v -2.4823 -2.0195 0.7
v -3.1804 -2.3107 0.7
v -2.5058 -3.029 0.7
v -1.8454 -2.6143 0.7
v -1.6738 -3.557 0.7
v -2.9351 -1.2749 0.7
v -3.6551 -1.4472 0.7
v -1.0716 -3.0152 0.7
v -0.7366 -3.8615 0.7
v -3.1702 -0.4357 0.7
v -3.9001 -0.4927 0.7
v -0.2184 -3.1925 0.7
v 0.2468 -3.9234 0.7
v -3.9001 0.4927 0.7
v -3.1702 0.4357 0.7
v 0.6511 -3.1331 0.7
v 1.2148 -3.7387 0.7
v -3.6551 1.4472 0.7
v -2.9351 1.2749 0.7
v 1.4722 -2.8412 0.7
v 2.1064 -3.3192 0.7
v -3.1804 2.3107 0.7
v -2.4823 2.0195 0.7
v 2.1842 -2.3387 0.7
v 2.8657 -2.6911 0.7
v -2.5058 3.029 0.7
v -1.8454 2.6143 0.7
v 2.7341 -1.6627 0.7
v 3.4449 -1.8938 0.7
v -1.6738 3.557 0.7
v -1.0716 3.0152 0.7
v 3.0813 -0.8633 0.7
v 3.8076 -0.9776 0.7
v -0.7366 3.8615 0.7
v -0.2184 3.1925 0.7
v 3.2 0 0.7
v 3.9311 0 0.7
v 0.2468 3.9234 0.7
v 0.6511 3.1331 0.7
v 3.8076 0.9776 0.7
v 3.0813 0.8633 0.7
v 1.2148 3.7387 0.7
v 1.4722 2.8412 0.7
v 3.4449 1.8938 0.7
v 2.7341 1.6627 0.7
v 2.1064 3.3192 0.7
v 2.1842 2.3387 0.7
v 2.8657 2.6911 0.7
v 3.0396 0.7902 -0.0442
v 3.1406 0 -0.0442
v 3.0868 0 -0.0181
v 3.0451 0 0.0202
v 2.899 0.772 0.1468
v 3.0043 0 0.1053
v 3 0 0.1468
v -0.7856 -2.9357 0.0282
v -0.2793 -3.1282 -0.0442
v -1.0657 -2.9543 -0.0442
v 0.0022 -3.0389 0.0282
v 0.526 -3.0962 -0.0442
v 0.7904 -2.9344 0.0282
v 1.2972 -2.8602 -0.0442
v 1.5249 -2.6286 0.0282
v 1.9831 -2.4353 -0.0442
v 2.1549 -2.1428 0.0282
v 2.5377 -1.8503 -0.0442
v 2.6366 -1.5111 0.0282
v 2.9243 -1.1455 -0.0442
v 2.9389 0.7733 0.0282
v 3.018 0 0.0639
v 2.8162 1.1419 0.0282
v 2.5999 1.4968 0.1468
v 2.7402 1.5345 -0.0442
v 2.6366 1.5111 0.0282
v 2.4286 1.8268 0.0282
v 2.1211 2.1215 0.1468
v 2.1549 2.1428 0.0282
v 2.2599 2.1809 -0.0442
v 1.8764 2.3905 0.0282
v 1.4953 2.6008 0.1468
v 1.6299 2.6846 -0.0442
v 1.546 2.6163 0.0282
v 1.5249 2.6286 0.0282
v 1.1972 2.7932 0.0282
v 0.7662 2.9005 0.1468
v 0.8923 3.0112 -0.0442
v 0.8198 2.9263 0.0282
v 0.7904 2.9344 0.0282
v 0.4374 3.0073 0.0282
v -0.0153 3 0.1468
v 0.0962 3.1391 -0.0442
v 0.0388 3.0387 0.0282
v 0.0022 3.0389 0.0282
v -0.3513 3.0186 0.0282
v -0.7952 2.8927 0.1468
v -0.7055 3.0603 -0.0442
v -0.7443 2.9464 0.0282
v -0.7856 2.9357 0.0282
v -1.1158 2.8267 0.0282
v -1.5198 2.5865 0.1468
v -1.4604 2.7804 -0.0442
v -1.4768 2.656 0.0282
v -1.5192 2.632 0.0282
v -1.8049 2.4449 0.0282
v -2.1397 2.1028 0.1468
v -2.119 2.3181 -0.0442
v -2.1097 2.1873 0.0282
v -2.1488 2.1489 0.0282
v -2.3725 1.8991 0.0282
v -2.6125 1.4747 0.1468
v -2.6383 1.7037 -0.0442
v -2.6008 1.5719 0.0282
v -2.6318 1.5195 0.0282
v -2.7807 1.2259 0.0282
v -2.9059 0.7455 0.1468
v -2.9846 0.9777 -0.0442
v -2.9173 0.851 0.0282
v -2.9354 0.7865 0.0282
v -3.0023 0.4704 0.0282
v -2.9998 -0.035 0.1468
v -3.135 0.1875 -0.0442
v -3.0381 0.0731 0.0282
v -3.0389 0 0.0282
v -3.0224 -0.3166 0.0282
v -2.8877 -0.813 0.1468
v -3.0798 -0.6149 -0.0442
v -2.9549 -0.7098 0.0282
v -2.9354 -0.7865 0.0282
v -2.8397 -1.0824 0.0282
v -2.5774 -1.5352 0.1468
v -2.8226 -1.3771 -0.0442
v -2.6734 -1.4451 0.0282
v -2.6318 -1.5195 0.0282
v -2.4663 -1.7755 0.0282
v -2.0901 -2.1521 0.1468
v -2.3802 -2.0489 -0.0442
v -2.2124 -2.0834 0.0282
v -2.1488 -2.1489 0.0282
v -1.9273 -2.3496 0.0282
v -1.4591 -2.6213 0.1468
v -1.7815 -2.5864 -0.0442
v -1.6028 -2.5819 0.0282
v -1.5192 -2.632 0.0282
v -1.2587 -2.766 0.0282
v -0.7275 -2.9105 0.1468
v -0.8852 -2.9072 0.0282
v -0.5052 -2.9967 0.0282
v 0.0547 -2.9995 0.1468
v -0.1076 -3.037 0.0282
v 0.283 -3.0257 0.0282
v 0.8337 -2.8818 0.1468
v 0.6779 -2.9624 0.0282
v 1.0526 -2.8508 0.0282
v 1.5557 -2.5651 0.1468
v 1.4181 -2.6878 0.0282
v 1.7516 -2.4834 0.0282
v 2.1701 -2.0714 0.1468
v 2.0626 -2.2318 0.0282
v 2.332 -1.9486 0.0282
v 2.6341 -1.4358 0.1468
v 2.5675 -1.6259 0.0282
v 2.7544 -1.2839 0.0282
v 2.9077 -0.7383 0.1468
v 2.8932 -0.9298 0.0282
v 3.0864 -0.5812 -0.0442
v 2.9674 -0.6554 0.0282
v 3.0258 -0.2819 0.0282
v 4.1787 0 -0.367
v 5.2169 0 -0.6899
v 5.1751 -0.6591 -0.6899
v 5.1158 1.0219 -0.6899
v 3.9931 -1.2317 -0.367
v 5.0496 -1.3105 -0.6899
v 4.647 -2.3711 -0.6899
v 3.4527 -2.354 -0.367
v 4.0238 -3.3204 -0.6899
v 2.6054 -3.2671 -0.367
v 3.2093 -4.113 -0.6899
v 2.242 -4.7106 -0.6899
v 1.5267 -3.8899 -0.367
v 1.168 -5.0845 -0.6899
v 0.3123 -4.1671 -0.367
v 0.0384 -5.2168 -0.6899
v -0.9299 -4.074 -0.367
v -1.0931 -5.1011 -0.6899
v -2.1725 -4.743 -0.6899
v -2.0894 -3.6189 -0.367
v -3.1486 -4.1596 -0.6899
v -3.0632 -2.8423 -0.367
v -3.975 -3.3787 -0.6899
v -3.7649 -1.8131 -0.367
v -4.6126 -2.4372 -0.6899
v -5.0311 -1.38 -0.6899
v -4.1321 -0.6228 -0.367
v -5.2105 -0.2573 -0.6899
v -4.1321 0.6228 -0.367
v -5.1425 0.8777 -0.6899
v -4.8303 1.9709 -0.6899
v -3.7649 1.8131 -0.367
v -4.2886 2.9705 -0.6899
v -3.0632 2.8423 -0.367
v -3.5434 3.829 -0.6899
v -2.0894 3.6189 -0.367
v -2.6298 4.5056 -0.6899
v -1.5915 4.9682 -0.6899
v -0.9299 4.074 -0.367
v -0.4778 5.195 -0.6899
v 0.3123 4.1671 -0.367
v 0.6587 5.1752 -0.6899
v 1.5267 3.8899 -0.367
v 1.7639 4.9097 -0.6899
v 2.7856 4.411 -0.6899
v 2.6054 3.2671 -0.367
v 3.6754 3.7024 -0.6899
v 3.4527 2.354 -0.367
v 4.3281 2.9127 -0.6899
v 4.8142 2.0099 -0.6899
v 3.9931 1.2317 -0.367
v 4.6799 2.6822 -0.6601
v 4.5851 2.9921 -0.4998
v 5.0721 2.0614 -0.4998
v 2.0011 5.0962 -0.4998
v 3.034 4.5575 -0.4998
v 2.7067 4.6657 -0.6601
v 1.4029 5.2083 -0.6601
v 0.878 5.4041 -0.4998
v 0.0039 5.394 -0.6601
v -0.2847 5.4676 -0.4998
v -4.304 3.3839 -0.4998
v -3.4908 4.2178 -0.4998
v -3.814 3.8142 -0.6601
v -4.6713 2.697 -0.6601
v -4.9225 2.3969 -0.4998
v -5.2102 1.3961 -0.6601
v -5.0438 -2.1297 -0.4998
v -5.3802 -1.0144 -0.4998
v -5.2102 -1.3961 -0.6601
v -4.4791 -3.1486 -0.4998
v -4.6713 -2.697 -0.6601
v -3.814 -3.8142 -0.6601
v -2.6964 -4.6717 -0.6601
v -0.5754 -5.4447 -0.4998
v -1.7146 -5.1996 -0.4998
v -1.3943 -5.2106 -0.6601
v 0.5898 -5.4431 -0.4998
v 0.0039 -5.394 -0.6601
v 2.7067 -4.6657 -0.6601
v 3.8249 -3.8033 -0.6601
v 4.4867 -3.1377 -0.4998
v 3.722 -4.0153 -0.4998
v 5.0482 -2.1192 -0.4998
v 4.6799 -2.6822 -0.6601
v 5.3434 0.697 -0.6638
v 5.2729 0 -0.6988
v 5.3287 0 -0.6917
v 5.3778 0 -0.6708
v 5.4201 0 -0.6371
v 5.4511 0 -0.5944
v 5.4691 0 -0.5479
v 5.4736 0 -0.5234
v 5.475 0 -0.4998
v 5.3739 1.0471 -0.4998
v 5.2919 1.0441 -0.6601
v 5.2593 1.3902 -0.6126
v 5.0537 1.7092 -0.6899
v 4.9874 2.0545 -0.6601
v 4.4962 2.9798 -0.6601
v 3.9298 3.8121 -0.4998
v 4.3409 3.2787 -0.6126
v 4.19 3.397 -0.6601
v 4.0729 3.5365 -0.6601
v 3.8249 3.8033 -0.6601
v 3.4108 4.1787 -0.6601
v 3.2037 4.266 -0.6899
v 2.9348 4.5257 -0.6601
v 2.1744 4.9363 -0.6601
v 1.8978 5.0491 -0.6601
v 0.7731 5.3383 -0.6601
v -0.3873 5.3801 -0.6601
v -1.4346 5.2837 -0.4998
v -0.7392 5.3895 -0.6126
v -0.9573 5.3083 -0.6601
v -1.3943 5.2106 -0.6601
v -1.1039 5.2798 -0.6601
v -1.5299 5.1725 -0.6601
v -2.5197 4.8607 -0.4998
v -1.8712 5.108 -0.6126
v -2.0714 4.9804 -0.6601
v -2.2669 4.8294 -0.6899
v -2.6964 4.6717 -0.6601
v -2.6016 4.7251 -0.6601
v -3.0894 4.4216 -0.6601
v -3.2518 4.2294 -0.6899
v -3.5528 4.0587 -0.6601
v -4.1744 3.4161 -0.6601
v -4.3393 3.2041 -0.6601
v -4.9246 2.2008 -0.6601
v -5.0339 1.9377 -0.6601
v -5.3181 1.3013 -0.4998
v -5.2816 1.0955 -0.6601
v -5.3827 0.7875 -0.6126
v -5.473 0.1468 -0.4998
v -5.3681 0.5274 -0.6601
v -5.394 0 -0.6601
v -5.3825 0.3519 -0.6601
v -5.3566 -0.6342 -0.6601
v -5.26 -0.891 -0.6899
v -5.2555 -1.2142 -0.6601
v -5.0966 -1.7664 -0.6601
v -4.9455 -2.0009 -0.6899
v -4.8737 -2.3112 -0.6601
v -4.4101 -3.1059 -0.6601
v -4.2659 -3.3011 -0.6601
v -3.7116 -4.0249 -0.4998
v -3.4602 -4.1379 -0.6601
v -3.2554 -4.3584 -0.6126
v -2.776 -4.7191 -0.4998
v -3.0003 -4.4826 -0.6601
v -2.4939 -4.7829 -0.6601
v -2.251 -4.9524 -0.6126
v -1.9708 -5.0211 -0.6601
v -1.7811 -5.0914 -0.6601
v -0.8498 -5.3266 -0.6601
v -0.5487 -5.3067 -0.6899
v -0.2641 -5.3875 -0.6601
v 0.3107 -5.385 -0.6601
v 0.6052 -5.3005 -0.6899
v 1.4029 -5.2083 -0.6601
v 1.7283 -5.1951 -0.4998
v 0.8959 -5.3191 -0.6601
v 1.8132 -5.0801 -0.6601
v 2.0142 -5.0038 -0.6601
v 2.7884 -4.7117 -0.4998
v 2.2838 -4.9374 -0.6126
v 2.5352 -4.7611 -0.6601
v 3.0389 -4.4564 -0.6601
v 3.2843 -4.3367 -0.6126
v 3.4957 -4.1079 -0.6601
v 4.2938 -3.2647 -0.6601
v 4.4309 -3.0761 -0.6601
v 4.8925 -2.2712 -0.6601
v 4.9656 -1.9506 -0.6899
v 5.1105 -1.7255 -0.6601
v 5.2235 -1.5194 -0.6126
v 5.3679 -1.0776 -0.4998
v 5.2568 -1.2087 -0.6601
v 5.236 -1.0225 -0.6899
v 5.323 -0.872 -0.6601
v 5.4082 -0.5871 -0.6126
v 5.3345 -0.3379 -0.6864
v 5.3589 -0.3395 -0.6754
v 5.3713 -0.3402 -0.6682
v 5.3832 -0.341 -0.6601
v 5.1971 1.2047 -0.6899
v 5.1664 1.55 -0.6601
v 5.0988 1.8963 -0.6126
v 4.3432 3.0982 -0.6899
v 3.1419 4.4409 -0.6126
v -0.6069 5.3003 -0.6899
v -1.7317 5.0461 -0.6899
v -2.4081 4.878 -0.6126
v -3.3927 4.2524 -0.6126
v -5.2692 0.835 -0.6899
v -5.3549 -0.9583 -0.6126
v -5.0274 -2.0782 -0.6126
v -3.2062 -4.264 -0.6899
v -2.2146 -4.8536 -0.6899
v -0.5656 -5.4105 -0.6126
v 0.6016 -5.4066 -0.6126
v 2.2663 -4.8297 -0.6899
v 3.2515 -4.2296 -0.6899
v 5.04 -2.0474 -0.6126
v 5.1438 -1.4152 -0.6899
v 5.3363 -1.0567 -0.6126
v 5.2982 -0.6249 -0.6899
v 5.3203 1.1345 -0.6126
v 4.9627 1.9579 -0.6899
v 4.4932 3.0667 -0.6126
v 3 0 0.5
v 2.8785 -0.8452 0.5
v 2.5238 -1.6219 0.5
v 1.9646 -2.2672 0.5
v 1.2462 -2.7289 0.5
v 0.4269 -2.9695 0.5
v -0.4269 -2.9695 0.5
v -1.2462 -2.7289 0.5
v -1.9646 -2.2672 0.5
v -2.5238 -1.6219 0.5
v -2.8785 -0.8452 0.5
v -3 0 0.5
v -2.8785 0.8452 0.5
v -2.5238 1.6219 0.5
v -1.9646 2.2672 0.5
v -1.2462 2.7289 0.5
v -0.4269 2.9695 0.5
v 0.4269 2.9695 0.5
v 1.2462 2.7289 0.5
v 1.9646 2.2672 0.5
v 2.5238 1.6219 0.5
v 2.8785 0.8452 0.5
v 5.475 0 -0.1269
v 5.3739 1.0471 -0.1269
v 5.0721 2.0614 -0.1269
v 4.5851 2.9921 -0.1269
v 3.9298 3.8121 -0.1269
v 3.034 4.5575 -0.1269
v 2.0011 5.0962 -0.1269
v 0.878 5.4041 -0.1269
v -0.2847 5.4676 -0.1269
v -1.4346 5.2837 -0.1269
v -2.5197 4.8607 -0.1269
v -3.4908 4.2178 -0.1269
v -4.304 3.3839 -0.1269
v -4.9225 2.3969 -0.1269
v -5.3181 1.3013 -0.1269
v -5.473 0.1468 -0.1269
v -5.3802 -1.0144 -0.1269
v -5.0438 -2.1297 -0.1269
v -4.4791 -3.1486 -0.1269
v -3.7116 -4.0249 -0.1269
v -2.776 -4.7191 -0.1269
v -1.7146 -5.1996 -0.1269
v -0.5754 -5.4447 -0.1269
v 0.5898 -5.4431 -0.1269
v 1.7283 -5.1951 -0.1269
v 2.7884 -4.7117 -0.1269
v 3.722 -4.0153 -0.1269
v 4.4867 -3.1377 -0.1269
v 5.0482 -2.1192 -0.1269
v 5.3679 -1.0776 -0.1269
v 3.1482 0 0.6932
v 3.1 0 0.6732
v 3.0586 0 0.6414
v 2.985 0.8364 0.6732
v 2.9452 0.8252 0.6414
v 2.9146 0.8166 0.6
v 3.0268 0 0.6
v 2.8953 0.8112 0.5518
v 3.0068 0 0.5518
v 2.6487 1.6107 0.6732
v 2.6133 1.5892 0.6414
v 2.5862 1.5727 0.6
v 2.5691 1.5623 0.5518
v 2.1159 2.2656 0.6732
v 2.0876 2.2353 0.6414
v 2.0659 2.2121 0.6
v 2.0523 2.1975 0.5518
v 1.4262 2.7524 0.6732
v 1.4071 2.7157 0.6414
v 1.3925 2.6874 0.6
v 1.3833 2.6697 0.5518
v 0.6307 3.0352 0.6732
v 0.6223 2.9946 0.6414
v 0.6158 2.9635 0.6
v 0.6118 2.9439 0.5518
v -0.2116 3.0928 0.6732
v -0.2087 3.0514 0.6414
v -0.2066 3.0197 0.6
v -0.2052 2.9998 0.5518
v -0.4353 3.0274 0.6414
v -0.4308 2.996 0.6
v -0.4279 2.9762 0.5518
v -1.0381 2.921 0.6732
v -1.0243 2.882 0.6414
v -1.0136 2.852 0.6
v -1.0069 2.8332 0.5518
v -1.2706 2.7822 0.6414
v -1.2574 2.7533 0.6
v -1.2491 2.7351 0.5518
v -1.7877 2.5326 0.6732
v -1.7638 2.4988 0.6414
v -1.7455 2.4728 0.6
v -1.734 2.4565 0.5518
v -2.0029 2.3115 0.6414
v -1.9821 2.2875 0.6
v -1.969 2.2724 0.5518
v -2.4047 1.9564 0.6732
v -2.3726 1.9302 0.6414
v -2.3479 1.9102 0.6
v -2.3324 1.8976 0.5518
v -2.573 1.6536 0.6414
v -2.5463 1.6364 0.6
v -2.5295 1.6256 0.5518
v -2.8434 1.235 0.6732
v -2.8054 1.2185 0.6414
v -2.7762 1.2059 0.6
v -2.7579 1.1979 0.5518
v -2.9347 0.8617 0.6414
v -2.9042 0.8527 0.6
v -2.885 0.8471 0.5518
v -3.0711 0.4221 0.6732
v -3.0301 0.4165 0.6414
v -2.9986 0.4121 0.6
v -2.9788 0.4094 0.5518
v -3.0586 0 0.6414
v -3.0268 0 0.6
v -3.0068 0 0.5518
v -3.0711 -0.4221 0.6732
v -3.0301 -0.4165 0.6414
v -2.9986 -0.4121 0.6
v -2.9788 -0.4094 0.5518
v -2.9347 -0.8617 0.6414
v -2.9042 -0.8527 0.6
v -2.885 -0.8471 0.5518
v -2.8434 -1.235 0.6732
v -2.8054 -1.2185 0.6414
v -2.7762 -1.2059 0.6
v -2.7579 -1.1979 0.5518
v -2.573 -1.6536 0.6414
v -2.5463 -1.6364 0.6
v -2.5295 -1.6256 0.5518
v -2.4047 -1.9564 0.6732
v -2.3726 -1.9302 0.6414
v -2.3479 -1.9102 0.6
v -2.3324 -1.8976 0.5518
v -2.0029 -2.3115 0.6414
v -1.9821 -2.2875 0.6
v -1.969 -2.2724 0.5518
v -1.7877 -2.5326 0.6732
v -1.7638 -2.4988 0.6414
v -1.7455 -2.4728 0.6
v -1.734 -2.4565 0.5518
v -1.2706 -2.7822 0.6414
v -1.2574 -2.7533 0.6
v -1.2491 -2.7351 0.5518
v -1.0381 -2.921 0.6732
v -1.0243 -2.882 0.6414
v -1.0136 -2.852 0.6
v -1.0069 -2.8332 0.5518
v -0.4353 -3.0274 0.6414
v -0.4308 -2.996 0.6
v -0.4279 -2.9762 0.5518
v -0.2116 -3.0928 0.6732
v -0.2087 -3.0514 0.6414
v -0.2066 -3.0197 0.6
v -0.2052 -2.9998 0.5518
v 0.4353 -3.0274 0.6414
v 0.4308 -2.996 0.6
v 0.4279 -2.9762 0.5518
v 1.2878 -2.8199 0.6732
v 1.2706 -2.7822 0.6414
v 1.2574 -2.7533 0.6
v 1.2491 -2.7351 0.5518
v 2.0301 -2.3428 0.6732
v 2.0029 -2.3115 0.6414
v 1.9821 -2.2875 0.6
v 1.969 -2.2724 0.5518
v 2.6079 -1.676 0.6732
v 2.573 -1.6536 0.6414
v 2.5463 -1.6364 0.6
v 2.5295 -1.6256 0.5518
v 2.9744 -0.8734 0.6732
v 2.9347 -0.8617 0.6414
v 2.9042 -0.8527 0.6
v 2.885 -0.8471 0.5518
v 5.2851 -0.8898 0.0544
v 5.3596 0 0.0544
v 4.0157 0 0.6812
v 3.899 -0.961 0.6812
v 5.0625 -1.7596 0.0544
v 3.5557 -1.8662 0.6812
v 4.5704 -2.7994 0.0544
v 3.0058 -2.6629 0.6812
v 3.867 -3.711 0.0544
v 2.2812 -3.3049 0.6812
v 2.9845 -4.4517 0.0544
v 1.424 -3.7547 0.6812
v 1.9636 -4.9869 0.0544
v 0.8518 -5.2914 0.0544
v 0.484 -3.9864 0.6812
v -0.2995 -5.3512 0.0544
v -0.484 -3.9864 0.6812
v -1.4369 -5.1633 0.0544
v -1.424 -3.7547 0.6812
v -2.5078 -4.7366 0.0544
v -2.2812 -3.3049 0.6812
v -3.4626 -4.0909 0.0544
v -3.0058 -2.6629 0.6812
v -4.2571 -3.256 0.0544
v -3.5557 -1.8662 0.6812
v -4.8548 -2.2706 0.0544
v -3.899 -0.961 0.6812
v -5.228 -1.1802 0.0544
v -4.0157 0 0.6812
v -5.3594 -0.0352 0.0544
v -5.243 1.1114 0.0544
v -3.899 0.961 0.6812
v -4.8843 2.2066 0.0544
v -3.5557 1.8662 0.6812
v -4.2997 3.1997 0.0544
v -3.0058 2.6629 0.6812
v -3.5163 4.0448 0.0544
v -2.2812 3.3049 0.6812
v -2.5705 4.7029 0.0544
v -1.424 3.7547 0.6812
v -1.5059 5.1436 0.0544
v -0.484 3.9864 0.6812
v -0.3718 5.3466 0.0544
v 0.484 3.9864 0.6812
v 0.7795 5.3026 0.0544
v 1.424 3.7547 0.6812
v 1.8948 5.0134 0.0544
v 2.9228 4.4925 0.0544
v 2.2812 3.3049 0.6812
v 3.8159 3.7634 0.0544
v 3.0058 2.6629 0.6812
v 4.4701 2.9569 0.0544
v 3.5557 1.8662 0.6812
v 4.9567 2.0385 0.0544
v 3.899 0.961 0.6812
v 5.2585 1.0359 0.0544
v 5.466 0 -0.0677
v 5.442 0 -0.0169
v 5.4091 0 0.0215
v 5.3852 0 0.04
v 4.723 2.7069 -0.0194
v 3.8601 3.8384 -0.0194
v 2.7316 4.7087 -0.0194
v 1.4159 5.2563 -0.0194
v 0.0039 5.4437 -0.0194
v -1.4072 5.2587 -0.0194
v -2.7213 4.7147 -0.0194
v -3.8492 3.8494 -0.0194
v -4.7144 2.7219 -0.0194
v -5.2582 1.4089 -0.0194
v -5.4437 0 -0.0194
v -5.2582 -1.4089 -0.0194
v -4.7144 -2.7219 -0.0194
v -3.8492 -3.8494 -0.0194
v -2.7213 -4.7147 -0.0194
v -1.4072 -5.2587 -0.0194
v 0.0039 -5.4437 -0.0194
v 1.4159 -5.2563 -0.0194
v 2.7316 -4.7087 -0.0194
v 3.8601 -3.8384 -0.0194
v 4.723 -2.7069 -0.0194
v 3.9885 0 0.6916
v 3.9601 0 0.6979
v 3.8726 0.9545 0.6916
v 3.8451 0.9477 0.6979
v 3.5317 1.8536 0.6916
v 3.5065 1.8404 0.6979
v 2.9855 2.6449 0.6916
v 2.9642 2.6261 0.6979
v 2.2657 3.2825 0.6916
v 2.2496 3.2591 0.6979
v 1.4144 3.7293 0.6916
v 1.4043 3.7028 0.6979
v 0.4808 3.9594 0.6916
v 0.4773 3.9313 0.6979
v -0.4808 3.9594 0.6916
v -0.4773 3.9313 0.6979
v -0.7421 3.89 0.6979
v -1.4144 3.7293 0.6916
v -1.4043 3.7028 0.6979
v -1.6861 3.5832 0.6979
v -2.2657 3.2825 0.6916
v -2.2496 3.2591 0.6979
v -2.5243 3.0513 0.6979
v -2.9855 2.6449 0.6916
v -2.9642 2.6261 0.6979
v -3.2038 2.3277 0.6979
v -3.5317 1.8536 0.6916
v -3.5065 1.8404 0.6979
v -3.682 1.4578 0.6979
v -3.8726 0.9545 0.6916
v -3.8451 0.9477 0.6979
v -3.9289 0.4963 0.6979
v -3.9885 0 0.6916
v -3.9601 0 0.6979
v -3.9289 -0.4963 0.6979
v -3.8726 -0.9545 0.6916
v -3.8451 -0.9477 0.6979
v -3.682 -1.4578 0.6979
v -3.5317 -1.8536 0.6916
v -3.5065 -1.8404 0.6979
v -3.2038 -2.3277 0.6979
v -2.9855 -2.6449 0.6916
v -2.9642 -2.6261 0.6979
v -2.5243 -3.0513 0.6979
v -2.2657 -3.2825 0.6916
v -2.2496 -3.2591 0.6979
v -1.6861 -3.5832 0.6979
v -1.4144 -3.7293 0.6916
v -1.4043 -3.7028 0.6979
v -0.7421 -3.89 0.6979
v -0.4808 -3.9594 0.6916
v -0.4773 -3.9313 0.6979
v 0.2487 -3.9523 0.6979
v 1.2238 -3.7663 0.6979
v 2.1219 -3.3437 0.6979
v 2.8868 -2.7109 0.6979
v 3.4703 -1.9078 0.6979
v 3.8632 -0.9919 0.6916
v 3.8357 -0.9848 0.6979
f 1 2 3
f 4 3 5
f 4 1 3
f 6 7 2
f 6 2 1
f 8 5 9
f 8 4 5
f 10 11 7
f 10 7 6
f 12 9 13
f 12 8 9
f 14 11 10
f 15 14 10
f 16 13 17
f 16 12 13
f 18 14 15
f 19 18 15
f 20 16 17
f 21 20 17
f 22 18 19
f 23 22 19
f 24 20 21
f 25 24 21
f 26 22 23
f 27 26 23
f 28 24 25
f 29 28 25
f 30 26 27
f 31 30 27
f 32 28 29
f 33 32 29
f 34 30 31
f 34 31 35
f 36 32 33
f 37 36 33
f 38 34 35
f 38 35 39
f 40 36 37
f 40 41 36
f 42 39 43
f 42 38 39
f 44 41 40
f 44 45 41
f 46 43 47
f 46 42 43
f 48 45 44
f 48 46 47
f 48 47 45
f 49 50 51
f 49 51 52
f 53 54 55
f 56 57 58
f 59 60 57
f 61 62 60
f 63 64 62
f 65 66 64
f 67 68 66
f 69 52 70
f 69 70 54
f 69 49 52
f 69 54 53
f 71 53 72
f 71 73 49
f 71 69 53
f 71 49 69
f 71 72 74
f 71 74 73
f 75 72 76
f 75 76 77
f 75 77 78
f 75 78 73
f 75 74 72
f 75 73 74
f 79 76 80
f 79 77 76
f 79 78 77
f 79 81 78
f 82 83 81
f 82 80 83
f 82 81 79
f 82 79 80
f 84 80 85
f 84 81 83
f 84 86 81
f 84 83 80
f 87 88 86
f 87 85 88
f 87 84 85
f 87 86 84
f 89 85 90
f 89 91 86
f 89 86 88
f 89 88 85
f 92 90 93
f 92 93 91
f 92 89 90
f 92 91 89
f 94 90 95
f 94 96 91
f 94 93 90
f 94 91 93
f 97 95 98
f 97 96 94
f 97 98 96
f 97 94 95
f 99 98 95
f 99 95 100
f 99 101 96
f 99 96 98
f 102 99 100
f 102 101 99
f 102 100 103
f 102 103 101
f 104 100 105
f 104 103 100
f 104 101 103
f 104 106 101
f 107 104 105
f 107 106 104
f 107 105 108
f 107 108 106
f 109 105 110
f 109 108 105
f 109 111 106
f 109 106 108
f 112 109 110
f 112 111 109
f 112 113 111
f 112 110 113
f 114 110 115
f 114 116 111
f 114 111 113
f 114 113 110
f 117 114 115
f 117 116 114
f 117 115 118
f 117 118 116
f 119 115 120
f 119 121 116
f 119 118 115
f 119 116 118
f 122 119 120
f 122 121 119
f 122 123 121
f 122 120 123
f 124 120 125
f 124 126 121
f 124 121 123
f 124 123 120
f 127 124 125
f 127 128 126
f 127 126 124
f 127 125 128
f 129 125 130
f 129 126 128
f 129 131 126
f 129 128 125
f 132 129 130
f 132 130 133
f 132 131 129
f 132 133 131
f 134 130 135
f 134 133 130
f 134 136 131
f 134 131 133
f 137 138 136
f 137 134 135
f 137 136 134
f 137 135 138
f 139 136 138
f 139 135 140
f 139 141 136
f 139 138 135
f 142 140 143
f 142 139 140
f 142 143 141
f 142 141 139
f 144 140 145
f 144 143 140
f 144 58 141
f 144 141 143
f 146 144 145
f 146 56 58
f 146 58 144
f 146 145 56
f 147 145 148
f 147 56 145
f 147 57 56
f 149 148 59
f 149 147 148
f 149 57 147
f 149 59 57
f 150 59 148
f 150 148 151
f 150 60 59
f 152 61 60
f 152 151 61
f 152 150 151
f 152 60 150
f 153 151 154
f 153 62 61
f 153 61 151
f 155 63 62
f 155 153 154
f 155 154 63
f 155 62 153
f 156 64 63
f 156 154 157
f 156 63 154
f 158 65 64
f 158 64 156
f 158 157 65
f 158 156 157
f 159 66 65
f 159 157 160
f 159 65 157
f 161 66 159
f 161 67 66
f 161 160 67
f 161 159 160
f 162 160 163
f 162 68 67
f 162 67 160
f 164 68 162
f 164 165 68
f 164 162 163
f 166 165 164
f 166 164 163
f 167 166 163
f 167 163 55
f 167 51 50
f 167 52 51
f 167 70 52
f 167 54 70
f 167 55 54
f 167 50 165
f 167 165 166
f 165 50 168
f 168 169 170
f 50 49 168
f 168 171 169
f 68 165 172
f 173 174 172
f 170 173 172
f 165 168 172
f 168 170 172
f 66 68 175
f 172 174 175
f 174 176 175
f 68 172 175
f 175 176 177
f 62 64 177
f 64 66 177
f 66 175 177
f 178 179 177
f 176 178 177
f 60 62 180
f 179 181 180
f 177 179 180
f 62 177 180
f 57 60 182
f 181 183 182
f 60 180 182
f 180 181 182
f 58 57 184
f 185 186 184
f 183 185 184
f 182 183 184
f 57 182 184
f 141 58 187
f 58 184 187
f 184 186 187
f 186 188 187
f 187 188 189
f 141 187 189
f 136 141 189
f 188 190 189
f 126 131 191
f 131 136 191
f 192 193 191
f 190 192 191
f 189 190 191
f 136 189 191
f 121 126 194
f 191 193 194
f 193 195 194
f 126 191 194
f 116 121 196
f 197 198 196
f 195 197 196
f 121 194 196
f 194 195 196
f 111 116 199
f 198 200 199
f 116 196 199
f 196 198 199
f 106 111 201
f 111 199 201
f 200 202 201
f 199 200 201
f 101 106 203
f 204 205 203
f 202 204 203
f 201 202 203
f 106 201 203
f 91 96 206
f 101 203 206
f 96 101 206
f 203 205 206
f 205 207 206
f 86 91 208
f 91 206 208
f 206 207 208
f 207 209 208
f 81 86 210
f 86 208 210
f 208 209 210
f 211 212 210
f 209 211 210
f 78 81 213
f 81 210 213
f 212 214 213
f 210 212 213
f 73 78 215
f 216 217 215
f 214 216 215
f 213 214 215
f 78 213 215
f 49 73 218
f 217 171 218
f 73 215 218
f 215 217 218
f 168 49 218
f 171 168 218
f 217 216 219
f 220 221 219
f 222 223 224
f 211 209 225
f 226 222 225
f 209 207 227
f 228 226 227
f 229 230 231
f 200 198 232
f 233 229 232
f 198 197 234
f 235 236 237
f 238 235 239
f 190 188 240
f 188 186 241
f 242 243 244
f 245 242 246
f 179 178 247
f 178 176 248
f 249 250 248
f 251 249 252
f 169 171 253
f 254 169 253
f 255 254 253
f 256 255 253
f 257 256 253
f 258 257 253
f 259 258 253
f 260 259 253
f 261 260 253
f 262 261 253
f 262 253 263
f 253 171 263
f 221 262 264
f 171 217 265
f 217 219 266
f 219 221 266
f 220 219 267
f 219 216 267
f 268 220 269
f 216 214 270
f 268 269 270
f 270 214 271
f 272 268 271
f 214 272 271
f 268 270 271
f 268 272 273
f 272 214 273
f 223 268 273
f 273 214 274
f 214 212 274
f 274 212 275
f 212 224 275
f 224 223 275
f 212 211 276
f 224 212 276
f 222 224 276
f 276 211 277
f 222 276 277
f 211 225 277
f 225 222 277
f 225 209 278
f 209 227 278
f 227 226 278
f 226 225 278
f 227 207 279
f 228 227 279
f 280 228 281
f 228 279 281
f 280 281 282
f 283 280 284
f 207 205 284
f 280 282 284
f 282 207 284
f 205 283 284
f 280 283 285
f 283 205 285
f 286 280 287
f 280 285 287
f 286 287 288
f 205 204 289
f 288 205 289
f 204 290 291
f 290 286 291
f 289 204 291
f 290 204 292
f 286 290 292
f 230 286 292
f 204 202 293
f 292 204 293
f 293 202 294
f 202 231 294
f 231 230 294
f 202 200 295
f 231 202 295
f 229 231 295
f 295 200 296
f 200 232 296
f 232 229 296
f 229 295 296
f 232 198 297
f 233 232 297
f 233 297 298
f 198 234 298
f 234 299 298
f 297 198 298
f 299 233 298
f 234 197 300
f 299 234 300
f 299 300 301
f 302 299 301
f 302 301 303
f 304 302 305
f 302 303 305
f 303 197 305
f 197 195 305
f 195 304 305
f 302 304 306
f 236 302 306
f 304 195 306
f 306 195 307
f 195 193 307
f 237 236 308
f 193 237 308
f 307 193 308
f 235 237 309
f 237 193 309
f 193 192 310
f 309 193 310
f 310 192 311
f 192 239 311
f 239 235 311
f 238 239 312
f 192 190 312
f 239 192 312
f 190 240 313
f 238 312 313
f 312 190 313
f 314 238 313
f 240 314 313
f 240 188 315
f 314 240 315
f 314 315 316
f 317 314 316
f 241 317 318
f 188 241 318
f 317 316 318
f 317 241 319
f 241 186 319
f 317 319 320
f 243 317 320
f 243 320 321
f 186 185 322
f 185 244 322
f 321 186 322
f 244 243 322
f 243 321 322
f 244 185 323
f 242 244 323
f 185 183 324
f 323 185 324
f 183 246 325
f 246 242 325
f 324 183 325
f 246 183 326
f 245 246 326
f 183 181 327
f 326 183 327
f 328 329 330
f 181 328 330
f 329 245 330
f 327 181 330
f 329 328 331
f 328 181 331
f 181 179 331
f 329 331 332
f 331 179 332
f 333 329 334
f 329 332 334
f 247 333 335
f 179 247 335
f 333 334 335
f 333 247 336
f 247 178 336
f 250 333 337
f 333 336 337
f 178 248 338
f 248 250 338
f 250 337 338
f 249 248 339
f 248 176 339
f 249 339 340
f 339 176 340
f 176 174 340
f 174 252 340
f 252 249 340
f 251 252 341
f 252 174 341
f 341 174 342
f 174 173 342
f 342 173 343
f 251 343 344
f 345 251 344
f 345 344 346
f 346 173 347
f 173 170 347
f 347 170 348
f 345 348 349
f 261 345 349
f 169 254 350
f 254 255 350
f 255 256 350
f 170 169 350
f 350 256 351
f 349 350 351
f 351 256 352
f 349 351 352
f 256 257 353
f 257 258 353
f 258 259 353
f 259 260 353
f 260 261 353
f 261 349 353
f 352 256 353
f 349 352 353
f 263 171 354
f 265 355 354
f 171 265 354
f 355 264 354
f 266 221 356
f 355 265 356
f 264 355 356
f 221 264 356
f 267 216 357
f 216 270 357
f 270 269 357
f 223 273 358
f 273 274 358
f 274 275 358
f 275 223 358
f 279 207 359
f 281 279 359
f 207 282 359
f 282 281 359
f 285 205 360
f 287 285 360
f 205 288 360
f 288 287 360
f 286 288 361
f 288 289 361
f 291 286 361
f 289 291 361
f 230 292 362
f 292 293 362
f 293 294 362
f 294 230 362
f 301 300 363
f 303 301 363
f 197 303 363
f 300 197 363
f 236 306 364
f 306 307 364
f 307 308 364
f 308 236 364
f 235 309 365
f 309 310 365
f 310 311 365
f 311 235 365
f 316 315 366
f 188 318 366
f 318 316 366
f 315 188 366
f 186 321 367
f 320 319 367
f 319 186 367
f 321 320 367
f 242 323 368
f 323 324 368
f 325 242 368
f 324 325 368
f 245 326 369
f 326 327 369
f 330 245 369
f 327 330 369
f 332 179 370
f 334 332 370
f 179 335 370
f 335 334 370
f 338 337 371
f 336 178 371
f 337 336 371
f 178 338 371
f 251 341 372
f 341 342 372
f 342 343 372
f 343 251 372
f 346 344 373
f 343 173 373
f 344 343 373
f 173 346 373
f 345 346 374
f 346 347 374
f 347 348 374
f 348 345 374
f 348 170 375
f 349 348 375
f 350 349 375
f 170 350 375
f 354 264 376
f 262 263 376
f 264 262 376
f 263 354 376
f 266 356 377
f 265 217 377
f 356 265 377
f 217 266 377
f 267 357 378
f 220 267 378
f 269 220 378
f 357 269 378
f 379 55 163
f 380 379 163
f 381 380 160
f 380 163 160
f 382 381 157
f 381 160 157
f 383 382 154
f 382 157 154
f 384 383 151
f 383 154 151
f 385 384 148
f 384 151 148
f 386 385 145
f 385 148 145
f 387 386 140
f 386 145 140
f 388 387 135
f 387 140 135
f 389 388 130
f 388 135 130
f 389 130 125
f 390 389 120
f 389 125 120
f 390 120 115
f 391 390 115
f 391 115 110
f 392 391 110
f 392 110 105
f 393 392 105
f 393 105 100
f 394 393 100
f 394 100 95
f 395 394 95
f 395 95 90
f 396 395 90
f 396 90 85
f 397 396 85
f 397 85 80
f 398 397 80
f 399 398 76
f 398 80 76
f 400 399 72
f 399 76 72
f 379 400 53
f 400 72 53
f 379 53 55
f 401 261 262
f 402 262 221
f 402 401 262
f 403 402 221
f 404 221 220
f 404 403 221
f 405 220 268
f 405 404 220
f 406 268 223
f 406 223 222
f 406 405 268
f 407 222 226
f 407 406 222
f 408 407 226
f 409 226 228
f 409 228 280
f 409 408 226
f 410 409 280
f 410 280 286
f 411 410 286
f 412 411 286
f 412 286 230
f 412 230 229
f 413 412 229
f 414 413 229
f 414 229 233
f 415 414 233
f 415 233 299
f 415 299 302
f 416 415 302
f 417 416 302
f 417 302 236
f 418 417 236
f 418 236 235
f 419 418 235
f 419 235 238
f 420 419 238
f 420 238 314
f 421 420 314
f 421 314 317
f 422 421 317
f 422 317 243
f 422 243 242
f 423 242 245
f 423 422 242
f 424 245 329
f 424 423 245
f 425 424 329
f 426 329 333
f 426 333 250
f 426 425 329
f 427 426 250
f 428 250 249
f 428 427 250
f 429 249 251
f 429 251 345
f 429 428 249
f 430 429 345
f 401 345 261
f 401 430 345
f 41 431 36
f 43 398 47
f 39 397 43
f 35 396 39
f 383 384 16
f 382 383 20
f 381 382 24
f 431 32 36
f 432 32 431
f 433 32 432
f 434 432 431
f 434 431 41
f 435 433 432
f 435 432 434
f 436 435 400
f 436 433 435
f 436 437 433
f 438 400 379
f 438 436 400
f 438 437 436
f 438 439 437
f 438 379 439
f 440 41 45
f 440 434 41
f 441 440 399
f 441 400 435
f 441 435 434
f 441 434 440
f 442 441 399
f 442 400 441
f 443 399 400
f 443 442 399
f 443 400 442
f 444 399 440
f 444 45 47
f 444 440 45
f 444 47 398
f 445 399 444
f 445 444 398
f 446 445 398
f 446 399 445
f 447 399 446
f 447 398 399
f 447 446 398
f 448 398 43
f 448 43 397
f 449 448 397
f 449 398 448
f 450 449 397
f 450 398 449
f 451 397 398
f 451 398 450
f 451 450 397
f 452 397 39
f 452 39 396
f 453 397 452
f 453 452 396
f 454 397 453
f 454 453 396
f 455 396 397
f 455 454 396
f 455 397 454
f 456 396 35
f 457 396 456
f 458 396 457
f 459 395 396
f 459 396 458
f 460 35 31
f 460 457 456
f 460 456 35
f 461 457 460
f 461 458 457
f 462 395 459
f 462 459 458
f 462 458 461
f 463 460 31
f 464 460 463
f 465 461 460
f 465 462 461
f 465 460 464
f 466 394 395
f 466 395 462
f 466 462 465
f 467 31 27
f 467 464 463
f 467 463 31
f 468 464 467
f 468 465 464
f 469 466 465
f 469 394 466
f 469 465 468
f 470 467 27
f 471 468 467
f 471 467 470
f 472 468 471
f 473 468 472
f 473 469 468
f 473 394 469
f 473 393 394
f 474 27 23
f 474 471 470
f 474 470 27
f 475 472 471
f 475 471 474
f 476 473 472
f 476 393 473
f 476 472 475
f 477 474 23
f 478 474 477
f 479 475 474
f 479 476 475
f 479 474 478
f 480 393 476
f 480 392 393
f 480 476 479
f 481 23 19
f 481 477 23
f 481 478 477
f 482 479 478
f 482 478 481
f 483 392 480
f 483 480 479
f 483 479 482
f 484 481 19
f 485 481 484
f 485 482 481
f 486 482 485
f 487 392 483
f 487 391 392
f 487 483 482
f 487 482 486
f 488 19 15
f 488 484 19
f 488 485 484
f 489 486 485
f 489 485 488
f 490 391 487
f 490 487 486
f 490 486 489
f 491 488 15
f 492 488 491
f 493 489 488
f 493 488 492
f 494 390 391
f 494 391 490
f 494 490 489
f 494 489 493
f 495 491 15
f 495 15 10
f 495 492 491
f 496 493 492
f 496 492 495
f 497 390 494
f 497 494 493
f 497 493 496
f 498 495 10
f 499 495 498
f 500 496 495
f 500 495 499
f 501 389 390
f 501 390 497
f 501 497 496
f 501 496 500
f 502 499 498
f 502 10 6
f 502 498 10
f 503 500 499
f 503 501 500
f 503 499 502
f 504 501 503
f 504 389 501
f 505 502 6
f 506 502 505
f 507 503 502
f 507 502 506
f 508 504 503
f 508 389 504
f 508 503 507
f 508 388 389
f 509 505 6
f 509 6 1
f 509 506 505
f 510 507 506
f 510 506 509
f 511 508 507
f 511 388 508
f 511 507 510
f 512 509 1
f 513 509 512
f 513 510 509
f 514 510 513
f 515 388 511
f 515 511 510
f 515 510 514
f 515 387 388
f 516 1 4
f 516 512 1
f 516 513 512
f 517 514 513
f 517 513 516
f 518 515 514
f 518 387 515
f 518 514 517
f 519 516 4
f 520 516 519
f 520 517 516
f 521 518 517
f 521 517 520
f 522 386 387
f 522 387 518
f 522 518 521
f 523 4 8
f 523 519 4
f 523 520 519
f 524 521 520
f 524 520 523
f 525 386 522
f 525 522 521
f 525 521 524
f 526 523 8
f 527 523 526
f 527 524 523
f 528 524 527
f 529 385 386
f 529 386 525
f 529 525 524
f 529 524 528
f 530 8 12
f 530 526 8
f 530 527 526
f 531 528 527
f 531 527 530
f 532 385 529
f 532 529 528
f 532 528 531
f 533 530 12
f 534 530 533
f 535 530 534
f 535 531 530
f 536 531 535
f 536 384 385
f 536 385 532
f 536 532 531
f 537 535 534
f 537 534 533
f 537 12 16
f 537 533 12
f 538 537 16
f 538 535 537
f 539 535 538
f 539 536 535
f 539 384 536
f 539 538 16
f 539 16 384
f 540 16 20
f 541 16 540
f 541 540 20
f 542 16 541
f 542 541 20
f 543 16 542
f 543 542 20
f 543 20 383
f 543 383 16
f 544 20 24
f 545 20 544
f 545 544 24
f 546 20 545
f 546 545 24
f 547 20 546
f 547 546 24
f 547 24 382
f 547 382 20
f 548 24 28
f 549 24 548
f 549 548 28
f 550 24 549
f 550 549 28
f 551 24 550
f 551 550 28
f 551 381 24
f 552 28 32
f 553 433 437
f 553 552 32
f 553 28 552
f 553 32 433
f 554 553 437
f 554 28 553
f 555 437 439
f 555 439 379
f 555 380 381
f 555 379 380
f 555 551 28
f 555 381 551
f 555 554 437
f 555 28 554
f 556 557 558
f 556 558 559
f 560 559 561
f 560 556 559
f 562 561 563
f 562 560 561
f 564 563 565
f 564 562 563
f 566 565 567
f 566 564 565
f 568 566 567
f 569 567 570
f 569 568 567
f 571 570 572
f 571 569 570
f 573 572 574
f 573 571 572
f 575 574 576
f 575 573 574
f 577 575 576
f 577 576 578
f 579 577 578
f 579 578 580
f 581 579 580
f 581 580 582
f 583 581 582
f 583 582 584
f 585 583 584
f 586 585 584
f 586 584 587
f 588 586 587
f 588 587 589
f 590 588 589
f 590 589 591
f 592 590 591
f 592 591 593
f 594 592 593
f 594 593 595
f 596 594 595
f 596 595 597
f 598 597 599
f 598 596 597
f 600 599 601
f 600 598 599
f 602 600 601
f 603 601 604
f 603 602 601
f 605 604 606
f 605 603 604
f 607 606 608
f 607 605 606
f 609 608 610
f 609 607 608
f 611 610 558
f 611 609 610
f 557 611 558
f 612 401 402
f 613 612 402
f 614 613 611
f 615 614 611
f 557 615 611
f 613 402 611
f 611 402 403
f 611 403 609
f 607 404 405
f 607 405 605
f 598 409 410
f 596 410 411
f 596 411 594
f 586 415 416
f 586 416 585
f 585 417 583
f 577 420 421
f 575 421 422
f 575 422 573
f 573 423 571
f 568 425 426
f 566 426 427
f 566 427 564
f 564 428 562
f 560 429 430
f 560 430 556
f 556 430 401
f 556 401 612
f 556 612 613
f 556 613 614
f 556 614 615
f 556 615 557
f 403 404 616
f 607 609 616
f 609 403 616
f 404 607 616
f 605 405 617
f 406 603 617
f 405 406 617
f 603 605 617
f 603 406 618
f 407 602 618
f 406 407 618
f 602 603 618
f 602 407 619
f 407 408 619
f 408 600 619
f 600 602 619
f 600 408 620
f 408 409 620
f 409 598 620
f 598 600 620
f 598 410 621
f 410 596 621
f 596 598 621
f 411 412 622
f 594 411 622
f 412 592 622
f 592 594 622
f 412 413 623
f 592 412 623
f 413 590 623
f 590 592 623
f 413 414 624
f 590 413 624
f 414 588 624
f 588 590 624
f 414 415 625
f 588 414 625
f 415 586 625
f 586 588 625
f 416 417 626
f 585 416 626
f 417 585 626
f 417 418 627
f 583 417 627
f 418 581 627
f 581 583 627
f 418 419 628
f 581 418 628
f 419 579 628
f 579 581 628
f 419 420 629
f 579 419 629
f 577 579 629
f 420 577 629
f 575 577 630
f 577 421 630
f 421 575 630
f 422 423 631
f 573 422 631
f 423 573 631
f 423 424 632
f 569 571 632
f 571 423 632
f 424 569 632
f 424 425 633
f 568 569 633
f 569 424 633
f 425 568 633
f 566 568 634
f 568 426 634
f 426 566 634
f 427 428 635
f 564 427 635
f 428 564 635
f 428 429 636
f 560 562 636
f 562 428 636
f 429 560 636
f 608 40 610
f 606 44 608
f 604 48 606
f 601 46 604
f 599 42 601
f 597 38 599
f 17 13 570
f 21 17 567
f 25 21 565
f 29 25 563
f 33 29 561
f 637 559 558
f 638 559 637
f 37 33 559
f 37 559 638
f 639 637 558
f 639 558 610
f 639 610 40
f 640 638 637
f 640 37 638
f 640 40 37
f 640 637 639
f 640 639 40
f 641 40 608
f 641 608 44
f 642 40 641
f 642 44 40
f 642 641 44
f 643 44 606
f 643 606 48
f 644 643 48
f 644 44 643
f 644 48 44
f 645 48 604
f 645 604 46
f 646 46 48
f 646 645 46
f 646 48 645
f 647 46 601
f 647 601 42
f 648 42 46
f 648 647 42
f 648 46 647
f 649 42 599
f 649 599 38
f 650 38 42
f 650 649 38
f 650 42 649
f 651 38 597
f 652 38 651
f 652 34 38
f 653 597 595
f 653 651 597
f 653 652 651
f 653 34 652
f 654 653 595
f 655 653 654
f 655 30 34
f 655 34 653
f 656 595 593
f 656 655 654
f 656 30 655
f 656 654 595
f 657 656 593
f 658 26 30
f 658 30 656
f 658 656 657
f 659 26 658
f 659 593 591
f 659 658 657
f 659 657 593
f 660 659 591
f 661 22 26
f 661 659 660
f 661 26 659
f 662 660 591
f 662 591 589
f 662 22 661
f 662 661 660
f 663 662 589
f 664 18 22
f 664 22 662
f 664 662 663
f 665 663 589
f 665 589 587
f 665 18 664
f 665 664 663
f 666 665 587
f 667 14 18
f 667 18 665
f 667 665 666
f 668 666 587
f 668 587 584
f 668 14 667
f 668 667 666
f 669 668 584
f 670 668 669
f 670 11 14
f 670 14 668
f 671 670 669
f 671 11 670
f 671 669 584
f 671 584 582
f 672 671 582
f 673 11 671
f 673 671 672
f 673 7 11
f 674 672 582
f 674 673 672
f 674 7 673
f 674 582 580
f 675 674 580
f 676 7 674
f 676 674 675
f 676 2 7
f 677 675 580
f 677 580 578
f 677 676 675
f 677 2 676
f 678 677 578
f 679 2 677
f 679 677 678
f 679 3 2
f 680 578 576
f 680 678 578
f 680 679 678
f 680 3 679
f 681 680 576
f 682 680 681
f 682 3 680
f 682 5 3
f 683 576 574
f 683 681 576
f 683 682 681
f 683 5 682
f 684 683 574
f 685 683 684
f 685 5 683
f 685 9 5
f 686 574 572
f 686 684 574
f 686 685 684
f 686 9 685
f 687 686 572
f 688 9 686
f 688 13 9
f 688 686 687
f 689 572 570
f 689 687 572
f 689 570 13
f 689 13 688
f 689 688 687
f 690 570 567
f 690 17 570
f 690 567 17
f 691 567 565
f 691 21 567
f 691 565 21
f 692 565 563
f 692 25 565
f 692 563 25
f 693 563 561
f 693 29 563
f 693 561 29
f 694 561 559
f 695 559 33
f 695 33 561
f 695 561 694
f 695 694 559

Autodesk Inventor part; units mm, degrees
ref_plane "YZ Plane" through (0, 0, 0) normal (1, 0, 0) x (0, 1, 0)
ref_plane "XZ Plane" through (0, 0, 0) normal (0, 1, 0) x (-1, 0, 0)
ref_plane "XY Plane" through (0, 0, 0) normal (0, 0, 1) x (1, 0, 0)
sketch "Szkic1" plane through (0, 0, 0) normal (0, 0, 1) x (1, 0, 0)
  circle A0 centre (0, 0) radius 3
  circle A1 centre (0, 0) radius 5.475
  dimension "d3" = 6
  dimension "d4" = 10.95
extrude "Wyciągnięcie proste1" add sketch "Szkic1" along normal mid plane 1.4
chamfer "Faza1" distance 1.5 distance2 0.7 1 edges at (-5.475, 0, 0.7) measured on face at (4.597, -0.4368, 0.7)
chamfer "Faza2" distance 2.25 distance2 0.7 1 edges at (-3, 0, -0.7) measured on face at (4.597, -0.4368, -0.7)
fillet "Zaokrąglenie2" radius 0.2 8 edges at (-3, 0, -0.0005) (-3, 0, 0) (-5.2495, 0, -0.7) (-5.475, 0, -0.7) (-5.475, 0, 0) (-5.475, 0, 0.0005) (-3.9755, 0, 0.7) (-3, 0, 0.7)
properties part number "PODKŁADKA M6x11" material "Stal"
